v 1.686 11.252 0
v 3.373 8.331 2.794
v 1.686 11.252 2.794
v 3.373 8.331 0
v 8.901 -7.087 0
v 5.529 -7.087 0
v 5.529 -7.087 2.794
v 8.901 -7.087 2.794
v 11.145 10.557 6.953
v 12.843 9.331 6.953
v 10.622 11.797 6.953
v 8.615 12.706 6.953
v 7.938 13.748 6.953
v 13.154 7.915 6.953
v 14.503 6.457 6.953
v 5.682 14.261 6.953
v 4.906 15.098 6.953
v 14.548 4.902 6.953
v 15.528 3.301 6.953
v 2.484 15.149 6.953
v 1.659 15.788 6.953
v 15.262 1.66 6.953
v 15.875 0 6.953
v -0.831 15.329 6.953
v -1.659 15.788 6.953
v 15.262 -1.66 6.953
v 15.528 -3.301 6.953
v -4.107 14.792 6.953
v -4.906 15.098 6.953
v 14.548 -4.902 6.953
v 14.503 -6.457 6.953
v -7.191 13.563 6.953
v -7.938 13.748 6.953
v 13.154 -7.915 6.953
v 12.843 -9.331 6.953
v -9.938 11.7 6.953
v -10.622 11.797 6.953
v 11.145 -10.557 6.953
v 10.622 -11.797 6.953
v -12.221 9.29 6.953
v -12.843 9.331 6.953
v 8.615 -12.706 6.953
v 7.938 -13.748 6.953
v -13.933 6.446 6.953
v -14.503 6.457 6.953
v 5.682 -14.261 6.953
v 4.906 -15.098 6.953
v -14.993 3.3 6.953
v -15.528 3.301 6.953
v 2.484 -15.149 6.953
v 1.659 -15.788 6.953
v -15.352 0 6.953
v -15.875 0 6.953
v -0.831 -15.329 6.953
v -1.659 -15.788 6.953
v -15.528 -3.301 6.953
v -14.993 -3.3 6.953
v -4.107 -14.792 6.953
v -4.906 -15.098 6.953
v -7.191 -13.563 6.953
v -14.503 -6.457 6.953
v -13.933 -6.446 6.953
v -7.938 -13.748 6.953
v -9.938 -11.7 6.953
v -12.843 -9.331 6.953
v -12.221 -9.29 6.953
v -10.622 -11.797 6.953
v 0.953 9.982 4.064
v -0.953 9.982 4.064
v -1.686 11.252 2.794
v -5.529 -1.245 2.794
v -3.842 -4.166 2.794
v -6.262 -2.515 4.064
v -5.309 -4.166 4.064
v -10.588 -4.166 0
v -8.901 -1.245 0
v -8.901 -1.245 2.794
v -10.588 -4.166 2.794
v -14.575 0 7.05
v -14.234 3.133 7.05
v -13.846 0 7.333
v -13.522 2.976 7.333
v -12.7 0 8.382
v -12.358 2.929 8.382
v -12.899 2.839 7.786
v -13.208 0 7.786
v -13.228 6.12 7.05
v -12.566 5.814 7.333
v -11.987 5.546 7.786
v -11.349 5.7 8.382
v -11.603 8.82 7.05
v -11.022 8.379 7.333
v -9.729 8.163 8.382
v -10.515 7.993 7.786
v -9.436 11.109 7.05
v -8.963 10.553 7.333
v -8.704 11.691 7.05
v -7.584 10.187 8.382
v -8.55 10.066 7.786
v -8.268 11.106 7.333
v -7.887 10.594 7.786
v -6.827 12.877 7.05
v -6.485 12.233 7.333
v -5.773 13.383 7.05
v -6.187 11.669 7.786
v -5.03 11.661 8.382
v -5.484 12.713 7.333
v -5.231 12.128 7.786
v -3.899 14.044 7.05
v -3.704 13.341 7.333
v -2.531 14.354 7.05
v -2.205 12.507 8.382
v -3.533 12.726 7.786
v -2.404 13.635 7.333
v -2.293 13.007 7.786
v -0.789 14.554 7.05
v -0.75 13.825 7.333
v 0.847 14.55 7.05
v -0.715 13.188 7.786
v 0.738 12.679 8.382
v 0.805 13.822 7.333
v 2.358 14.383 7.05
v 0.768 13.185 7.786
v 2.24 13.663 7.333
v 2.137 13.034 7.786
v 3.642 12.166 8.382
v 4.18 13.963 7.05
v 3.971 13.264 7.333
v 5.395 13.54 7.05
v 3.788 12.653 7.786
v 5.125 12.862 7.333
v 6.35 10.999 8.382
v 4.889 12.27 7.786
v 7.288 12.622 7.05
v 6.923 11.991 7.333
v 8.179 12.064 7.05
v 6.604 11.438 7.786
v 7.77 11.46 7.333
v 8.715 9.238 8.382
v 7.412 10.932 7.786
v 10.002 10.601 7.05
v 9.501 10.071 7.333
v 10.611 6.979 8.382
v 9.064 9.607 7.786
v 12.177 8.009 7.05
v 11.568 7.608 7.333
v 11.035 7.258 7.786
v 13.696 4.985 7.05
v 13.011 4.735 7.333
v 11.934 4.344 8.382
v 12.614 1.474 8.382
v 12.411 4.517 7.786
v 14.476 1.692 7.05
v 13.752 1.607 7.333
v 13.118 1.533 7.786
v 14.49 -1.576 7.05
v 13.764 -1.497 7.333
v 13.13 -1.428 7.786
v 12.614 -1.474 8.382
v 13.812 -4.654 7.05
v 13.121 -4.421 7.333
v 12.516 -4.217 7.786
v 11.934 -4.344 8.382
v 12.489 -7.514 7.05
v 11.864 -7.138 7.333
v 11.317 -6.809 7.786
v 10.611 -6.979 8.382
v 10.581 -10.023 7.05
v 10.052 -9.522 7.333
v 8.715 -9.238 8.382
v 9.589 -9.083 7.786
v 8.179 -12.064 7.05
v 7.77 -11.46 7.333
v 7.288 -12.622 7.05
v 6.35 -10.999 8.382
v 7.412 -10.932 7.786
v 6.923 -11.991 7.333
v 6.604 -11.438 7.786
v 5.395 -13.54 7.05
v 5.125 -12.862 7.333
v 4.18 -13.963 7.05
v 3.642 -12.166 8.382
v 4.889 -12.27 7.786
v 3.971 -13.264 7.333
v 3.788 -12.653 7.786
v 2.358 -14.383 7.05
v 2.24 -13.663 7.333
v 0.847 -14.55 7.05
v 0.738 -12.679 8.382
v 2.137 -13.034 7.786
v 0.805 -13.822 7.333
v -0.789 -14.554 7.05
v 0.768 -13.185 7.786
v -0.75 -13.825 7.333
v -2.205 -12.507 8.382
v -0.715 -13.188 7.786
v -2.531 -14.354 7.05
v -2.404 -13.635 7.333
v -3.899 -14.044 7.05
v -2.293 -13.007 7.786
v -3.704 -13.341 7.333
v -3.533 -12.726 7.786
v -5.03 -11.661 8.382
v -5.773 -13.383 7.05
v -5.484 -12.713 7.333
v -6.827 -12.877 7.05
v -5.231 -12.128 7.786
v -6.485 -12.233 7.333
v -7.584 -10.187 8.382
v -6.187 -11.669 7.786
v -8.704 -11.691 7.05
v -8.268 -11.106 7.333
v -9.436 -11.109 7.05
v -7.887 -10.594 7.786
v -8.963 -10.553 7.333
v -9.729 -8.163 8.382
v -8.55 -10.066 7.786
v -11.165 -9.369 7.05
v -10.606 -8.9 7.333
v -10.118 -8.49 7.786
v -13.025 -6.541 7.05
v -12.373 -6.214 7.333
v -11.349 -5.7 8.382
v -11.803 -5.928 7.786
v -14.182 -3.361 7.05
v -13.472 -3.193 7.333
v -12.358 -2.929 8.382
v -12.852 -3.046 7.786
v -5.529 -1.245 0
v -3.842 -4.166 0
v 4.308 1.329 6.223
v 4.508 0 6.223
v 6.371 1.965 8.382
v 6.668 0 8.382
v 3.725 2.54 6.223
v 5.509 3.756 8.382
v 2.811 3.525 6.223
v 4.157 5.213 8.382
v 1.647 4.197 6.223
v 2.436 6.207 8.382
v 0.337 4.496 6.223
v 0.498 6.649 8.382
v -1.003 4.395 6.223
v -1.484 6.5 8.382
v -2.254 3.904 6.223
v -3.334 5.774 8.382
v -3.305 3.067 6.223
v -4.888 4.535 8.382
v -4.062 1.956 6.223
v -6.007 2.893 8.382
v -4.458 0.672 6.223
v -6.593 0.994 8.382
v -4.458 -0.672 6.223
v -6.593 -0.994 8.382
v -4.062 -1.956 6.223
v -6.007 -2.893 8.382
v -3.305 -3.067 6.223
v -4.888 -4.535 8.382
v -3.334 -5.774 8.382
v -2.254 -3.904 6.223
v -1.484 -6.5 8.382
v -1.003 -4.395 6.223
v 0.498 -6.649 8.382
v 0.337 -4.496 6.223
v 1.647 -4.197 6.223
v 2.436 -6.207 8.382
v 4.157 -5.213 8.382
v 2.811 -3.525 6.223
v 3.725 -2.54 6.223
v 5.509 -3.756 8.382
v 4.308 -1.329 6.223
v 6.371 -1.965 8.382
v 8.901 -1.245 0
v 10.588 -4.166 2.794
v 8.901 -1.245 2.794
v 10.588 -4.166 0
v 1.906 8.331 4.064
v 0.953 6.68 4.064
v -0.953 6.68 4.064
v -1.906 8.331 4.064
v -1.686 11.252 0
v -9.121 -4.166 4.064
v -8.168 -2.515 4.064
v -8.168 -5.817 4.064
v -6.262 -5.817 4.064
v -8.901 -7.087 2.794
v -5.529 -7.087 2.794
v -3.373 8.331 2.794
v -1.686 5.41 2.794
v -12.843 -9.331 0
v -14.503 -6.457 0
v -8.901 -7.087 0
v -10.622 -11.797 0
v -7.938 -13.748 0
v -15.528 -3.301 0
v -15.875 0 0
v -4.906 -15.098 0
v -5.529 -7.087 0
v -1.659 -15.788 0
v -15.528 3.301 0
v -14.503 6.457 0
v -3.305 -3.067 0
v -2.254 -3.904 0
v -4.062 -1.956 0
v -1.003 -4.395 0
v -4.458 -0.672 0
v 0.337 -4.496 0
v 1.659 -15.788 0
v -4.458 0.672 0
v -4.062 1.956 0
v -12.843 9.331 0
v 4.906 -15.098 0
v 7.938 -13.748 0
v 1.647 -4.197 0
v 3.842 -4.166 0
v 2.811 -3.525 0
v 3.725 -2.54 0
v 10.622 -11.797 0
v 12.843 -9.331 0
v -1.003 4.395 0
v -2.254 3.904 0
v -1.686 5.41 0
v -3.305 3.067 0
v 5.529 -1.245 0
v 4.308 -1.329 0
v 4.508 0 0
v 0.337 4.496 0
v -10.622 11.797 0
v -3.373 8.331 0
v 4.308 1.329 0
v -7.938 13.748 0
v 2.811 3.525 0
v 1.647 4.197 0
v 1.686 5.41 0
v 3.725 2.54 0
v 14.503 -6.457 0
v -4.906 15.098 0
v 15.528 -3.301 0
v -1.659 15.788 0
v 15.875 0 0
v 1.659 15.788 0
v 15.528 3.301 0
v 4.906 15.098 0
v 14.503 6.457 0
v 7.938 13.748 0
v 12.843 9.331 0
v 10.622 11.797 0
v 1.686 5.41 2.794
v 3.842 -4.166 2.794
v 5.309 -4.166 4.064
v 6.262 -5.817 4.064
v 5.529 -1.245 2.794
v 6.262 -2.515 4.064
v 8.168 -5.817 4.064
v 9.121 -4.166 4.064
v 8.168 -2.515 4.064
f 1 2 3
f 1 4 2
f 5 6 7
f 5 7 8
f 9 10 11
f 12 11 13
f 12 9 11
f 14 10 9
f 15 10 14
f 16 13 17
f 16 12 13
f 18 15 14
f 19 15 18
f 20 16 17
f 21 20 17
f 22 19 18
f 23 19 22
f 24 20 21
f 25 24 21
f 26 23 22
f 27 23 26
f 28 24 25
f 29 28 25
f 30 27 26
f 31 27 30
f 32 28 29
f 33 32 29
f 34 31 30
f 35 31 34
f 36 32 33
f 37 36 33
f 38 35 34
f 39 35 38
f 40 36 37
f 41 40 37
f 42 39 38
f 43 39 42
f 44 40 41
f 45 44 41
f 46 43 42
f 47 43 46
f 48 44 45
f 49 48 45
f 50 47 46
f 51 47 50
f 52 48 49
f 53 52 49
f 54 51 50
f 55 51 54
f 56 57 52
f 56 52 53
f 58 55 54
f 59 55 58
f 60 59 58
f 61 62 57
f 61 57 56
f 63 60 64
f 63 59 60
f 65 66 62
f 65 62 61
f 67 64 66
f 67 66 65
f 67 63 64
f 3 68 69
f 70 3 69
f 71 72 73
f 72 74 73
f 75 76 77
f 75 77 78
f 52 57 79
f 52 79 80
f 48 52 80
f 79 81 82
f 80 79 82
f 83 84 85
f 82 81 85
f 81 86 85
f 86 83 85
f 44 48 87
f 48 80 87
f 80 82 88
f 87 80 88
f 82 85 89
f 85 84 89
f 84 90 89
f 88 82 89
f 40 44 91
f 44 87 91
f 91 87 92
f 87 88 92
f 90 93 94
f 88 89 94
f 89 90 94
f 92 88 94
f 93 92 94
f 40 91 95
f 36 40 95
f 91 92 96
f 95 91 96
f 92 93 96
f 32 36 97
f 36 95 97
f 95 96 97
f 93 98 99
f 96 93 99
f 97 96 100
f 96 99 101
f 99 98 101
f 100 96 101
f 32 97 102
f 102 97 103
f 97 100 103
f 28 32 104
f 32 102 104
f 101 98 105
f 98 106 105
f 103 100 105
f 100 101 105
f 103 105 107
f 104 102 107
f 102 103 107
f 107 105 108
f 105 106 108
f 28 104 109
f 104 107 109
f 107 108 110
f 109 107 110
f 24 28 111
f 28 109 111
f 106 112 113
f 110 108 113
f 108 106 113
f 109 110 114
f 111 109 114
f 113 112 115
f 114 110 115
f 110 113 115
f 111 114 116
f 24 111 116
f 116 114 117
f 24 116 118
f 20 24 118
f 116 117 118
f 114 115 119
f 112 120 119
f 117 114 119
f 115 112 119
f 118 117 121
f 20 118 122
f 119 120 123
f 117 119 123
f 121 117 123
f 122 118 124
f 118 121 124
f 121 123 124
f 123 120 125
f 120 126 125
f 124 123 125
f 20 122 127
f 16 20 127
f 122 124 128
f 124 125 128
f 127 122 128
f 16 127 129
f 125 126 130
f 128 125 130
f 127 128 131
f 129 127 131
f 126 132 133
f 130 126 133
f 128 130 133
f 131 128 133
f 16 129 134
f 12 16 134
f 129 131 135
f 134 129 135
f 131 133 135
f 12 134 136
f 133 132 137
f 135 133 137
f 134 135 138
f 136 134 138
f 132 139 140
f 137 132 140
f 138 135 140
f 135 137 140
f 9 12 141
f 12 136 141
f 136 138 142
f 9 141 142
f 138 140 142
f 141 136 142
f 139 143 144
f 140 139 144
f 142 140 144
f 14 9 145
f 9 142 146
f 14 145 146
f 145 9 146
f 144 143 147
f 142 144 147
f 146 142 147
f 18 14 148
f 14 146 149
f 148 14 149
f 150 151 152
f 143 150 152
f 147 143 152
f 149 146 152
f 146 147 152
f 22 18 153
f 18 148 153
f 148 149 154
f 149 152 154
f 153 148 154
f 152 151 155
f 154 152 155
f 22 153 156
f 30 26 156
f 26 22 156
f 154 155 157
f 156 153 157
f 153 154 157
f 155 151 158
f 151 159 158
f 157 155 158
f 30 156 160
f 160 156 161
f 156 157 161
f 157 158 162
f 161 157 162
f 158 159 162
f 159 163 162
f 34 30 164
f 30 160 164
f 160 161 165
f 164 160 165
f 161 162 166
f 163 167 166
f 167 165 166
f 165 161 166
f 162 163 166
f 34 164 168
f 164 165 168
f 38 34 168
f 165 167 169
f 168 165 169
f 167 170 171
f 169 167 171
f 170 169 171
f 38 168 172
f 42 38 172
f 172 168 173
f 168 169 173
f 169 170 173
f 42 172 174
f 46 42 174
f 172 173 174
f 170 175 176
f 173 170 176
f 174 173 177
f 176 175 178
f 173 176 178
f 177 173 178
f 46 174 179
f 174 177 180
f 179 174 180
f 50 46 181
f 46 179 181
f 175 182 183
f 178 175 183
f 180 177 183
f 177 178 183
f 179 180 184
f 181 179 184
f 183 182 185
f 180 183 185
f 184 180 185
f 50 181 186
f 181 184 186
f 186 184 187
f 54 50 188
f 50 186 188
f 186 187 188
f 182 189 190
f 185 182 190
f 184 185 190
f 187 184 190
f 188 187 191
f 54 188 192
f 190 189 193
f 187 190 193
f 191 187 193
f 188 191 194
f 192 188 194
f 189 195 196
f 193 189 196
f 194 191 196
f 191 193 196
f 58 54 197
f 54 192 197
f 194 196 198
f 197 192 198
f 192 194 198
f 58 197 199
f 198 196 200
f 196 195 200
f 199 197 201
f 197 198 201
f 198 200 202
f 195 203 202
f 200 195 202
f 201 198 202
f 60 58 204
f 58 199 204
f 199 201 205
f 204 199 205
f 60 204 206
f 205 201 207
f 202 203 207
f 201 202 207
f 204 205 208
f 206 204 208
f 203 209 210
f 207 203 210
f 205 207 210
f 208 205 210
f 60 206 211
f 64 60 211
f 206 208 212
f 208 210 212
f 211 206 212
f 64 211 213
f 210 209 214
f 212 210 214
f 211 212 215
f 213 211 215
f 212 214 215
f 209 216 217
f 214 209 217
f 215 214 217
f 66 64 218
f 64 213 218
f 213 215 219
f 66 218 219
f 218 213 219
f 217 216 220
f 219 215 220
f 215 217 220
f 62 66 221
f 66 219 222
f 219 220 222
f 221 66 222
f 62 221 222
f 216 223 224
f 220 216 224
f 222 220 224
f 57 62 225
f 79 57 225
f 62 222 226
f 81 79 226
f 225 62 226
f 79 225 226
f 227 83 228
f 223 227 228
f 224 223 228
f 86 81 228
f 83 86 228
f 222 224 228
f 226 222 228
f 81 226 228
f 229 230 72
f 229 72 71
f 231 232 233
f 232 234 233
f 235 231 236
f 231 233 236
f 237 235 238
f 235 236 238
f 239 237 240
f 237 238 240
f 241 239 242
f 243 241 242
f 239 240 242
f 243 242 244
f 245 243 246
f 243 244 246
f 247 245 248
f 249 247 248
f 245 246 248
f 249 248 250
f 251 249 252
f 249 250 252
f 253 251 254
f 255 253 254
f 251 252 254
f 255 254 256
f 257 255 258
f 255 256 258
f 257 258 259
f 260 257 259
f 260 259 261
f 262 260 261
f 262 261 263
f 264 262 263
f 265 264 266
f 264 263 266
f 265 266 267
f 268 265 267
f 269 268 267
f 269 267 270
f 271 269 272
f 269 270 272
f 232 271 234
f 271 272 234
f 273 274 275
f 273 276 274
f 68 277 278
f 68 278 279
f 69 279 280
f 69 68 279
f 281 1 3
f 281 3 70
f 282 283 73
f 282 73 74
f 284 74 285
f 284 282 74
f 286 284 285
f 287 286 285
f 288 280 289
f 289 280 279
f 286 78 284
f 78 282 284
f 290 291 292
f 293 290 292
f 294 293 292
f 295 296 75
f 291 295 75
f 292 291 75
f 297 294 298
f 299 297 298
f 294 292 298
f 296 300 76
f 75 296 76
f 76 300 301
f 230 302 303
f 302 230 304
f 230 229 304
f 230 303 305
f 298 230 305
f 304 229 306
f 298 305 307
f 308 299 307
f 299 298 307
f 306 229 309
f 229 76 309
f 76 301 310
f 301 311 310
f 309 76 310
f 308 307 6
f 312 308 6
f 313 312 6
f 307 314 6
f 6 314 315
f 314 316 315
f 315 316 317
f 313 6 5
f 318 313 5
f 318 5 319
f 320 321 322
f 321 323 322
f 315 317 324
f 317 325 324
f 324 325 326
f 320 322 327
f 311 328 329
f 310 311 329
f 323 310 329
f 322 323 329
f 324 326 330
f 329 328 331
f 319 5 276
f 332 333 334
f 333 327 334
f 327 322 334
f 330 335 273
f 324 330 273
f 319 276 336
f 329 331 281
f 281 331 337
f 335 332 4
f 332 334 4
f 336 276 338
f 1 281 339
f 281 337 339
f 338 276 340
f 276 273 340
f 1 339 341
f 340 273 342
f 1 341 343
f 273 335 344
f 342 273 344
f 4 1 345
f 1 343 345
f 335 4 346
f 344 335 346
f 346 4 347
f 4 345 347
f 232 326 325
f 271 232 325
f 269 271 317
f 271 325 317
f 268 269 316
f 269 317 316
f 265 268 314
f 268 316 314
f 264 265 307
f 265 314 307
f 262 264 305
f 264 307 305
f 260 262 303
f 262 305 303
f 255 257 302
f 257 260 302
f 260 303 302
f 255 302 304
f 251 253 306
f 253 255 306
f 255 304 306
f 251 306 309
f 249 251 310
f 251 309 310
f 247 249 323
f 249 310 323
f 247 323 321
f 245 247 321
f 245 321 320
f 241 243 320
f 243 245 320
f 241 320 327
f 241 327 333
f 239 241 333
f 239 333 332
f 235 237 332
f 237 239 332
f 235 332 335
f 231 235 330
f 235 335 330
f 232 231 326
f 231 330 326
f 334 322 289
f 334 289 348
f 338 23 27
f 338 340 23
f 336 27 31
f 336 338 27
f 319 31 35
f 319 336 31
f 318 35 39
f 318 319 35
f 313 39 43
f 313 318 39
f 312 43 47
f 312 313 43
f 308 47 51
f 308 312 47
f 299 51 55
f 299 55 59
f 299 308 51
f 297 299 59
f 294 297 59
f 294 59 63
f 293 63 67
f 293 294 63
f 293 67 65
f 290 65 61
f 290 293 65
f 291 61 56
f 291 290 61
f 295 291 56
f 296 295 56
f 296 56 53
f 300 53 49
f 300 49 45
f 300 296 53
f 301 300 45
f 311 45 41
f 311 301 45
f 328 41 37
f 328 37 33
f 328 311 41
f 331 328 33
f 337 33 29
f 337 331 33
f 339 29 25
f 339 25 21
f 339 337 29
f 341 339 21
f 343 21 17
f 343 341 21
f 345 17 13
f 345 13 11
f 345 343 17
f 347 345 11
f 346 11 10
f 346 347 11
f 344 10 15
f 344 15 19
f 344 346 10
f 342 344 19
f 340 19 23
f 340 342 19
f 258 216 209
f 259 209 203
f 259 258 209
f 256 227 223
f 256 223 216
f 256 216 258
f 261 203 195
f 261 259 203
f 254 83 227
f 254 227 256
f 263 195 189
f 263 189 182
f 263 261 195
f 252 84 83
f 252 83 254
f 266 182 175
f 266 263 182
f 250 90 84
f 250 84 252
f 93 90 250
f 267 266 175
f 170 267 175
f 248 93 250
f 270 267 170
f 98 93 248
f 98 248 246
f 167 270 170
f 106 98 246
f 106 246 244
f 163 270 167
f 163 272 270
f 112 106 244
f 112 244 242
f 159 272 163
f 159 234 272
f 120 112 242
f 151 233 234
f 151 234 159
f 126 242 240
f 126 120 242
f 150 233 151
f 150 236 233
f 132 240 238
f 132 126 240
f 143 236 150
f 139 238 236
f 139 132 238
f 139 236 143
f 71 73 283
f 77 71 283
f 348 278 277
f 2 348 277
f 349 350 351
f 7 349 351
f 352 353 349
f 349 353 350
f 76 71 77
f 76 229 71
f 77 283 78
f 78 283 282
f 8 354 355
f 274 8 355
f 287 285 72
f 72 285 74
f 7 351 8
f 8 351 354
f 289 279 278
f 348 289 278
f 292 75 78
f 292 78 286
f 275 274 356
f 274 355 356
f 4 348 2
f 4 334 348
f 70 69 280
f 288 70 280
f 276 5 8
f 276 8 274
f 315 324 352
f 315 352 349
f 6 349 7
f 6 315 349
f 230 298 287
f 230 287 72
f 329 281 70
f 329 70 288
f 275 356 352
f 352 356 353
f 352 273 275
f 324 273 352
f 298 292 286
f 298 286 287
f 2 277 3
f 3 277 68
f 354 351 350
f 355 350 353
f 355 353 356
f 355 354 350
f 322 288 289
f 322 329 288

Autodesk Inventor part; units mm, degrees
ref_plane "YZ Plane" through (0, 0, 0) normal (1, 0, 0) x (0, 1, 0)
ref_plane "XZ Plane" through (0, 0, 0) normal (0, 1, 0) x (-1, 0, 0)
ref_plane "XY Plane" through (0, 0, 0) normal (0, 0, 1) x (1, 0, 0)
sketch "Sketch2" plane through (0, 0, 0) normal (0, 0, 1) x (1, 0, 0)
  circle A0 centre (0, 0) radius 4.5085
  circle A1 centre (0, 0) radius 15.875
  dimension "d3" = 9.017
  dimension "d4" = 31.75
extrude "Extrusion2" add sketch "Sketch2" along normal blind 8.382
chamfer "Chamfer1" distance 2.159 angle 45 1 edges at (-4.5085, 0, 8.382)
sketch "Sketch6" plane through (0, 0, 0) normal (0, 1, 0) x (-1, 0, 0)
  line L0 (15.875, 8.382) -> (-15.875, 8.382) projected
  line L1 (-15.875, 0) -> (15.875, 0) projected
  line L2 (15.875, 8.382) -> (12.7, 8.382)
  line L3 (15.875, 8.382) -> (-15.875, 8.382) projected
  line L4 (15.875, 8.382) -> (15.875, 6.9533)
  line L5 (15.875, 0) -> (15.875, 8.382) projected
  line L6 (15.875, 6.9533) -> (13.335, 6.9533)
  line L7 (13.335, 6.9533) -> (12.7, 8.382)
  line L8 (0, 0) -> (0, 8.967)
  dimension "d21" = 3.175
  dimension "d22" = 1.4287
  dimension "d23" = 2.54
revolve "Revolution1" cut sketch "Sketch6" angle 360 about axis through (0, 0, 0) along (0, 0, 1) contours L4 L6 L7 L0
sketch "Sketch7" plane through (0, 0, 0) normal (0, 0, -1) x (-1, 0, 0)
  line L0 (-3.3729, 8.3312) -> (-1.6864, 11.2522)
  line L1 (-1.6864, 11.2522) -> (1.6864, 11.2522)
  line L2 (1.6864, 11.2522) -> (3.3729, 8.3312)
  line L3 (3.3729, 8.3312) -> (1.6864, 5.4102)
  line L4 (1.6864, 5.4102) -> (-1.6864, 5.4102)
  line L5 (-1.6864, 5.4102) -> (-3.3729, 8.3312)
  point P0 (0, 0)
  point P1 (0, 8.3312)
  dimension "d27" = 8.3312
  dimension "d28" = 5.842
extrude "Extrusion4" cut sketch "Sketch7" against normal blind 4.064
chamfer "Chamfer3" distance 1.27 angle 45 6 edges at (2.5297, 9.7917, 4.064) (0, 11.2522, 4.064) (-2.5297, 9.7917, 4.064) (-2.5297, 6.8707, 4.064) (0, 5.4102, 4.064) (2.5297, 6.8707, 4.064)
pattern_circular "Circular Pattern1" count 3 over 360 about axis through (0, 0, 0) along (0, 0, 1) of "Extrusion4", "Chamfer3"
fillet "Fillet3" radius 3.175 1 edges at (13.335, 0, 6.9533)
properties part number "SpurGearThrustDistributer" material "ABS Plastic"
